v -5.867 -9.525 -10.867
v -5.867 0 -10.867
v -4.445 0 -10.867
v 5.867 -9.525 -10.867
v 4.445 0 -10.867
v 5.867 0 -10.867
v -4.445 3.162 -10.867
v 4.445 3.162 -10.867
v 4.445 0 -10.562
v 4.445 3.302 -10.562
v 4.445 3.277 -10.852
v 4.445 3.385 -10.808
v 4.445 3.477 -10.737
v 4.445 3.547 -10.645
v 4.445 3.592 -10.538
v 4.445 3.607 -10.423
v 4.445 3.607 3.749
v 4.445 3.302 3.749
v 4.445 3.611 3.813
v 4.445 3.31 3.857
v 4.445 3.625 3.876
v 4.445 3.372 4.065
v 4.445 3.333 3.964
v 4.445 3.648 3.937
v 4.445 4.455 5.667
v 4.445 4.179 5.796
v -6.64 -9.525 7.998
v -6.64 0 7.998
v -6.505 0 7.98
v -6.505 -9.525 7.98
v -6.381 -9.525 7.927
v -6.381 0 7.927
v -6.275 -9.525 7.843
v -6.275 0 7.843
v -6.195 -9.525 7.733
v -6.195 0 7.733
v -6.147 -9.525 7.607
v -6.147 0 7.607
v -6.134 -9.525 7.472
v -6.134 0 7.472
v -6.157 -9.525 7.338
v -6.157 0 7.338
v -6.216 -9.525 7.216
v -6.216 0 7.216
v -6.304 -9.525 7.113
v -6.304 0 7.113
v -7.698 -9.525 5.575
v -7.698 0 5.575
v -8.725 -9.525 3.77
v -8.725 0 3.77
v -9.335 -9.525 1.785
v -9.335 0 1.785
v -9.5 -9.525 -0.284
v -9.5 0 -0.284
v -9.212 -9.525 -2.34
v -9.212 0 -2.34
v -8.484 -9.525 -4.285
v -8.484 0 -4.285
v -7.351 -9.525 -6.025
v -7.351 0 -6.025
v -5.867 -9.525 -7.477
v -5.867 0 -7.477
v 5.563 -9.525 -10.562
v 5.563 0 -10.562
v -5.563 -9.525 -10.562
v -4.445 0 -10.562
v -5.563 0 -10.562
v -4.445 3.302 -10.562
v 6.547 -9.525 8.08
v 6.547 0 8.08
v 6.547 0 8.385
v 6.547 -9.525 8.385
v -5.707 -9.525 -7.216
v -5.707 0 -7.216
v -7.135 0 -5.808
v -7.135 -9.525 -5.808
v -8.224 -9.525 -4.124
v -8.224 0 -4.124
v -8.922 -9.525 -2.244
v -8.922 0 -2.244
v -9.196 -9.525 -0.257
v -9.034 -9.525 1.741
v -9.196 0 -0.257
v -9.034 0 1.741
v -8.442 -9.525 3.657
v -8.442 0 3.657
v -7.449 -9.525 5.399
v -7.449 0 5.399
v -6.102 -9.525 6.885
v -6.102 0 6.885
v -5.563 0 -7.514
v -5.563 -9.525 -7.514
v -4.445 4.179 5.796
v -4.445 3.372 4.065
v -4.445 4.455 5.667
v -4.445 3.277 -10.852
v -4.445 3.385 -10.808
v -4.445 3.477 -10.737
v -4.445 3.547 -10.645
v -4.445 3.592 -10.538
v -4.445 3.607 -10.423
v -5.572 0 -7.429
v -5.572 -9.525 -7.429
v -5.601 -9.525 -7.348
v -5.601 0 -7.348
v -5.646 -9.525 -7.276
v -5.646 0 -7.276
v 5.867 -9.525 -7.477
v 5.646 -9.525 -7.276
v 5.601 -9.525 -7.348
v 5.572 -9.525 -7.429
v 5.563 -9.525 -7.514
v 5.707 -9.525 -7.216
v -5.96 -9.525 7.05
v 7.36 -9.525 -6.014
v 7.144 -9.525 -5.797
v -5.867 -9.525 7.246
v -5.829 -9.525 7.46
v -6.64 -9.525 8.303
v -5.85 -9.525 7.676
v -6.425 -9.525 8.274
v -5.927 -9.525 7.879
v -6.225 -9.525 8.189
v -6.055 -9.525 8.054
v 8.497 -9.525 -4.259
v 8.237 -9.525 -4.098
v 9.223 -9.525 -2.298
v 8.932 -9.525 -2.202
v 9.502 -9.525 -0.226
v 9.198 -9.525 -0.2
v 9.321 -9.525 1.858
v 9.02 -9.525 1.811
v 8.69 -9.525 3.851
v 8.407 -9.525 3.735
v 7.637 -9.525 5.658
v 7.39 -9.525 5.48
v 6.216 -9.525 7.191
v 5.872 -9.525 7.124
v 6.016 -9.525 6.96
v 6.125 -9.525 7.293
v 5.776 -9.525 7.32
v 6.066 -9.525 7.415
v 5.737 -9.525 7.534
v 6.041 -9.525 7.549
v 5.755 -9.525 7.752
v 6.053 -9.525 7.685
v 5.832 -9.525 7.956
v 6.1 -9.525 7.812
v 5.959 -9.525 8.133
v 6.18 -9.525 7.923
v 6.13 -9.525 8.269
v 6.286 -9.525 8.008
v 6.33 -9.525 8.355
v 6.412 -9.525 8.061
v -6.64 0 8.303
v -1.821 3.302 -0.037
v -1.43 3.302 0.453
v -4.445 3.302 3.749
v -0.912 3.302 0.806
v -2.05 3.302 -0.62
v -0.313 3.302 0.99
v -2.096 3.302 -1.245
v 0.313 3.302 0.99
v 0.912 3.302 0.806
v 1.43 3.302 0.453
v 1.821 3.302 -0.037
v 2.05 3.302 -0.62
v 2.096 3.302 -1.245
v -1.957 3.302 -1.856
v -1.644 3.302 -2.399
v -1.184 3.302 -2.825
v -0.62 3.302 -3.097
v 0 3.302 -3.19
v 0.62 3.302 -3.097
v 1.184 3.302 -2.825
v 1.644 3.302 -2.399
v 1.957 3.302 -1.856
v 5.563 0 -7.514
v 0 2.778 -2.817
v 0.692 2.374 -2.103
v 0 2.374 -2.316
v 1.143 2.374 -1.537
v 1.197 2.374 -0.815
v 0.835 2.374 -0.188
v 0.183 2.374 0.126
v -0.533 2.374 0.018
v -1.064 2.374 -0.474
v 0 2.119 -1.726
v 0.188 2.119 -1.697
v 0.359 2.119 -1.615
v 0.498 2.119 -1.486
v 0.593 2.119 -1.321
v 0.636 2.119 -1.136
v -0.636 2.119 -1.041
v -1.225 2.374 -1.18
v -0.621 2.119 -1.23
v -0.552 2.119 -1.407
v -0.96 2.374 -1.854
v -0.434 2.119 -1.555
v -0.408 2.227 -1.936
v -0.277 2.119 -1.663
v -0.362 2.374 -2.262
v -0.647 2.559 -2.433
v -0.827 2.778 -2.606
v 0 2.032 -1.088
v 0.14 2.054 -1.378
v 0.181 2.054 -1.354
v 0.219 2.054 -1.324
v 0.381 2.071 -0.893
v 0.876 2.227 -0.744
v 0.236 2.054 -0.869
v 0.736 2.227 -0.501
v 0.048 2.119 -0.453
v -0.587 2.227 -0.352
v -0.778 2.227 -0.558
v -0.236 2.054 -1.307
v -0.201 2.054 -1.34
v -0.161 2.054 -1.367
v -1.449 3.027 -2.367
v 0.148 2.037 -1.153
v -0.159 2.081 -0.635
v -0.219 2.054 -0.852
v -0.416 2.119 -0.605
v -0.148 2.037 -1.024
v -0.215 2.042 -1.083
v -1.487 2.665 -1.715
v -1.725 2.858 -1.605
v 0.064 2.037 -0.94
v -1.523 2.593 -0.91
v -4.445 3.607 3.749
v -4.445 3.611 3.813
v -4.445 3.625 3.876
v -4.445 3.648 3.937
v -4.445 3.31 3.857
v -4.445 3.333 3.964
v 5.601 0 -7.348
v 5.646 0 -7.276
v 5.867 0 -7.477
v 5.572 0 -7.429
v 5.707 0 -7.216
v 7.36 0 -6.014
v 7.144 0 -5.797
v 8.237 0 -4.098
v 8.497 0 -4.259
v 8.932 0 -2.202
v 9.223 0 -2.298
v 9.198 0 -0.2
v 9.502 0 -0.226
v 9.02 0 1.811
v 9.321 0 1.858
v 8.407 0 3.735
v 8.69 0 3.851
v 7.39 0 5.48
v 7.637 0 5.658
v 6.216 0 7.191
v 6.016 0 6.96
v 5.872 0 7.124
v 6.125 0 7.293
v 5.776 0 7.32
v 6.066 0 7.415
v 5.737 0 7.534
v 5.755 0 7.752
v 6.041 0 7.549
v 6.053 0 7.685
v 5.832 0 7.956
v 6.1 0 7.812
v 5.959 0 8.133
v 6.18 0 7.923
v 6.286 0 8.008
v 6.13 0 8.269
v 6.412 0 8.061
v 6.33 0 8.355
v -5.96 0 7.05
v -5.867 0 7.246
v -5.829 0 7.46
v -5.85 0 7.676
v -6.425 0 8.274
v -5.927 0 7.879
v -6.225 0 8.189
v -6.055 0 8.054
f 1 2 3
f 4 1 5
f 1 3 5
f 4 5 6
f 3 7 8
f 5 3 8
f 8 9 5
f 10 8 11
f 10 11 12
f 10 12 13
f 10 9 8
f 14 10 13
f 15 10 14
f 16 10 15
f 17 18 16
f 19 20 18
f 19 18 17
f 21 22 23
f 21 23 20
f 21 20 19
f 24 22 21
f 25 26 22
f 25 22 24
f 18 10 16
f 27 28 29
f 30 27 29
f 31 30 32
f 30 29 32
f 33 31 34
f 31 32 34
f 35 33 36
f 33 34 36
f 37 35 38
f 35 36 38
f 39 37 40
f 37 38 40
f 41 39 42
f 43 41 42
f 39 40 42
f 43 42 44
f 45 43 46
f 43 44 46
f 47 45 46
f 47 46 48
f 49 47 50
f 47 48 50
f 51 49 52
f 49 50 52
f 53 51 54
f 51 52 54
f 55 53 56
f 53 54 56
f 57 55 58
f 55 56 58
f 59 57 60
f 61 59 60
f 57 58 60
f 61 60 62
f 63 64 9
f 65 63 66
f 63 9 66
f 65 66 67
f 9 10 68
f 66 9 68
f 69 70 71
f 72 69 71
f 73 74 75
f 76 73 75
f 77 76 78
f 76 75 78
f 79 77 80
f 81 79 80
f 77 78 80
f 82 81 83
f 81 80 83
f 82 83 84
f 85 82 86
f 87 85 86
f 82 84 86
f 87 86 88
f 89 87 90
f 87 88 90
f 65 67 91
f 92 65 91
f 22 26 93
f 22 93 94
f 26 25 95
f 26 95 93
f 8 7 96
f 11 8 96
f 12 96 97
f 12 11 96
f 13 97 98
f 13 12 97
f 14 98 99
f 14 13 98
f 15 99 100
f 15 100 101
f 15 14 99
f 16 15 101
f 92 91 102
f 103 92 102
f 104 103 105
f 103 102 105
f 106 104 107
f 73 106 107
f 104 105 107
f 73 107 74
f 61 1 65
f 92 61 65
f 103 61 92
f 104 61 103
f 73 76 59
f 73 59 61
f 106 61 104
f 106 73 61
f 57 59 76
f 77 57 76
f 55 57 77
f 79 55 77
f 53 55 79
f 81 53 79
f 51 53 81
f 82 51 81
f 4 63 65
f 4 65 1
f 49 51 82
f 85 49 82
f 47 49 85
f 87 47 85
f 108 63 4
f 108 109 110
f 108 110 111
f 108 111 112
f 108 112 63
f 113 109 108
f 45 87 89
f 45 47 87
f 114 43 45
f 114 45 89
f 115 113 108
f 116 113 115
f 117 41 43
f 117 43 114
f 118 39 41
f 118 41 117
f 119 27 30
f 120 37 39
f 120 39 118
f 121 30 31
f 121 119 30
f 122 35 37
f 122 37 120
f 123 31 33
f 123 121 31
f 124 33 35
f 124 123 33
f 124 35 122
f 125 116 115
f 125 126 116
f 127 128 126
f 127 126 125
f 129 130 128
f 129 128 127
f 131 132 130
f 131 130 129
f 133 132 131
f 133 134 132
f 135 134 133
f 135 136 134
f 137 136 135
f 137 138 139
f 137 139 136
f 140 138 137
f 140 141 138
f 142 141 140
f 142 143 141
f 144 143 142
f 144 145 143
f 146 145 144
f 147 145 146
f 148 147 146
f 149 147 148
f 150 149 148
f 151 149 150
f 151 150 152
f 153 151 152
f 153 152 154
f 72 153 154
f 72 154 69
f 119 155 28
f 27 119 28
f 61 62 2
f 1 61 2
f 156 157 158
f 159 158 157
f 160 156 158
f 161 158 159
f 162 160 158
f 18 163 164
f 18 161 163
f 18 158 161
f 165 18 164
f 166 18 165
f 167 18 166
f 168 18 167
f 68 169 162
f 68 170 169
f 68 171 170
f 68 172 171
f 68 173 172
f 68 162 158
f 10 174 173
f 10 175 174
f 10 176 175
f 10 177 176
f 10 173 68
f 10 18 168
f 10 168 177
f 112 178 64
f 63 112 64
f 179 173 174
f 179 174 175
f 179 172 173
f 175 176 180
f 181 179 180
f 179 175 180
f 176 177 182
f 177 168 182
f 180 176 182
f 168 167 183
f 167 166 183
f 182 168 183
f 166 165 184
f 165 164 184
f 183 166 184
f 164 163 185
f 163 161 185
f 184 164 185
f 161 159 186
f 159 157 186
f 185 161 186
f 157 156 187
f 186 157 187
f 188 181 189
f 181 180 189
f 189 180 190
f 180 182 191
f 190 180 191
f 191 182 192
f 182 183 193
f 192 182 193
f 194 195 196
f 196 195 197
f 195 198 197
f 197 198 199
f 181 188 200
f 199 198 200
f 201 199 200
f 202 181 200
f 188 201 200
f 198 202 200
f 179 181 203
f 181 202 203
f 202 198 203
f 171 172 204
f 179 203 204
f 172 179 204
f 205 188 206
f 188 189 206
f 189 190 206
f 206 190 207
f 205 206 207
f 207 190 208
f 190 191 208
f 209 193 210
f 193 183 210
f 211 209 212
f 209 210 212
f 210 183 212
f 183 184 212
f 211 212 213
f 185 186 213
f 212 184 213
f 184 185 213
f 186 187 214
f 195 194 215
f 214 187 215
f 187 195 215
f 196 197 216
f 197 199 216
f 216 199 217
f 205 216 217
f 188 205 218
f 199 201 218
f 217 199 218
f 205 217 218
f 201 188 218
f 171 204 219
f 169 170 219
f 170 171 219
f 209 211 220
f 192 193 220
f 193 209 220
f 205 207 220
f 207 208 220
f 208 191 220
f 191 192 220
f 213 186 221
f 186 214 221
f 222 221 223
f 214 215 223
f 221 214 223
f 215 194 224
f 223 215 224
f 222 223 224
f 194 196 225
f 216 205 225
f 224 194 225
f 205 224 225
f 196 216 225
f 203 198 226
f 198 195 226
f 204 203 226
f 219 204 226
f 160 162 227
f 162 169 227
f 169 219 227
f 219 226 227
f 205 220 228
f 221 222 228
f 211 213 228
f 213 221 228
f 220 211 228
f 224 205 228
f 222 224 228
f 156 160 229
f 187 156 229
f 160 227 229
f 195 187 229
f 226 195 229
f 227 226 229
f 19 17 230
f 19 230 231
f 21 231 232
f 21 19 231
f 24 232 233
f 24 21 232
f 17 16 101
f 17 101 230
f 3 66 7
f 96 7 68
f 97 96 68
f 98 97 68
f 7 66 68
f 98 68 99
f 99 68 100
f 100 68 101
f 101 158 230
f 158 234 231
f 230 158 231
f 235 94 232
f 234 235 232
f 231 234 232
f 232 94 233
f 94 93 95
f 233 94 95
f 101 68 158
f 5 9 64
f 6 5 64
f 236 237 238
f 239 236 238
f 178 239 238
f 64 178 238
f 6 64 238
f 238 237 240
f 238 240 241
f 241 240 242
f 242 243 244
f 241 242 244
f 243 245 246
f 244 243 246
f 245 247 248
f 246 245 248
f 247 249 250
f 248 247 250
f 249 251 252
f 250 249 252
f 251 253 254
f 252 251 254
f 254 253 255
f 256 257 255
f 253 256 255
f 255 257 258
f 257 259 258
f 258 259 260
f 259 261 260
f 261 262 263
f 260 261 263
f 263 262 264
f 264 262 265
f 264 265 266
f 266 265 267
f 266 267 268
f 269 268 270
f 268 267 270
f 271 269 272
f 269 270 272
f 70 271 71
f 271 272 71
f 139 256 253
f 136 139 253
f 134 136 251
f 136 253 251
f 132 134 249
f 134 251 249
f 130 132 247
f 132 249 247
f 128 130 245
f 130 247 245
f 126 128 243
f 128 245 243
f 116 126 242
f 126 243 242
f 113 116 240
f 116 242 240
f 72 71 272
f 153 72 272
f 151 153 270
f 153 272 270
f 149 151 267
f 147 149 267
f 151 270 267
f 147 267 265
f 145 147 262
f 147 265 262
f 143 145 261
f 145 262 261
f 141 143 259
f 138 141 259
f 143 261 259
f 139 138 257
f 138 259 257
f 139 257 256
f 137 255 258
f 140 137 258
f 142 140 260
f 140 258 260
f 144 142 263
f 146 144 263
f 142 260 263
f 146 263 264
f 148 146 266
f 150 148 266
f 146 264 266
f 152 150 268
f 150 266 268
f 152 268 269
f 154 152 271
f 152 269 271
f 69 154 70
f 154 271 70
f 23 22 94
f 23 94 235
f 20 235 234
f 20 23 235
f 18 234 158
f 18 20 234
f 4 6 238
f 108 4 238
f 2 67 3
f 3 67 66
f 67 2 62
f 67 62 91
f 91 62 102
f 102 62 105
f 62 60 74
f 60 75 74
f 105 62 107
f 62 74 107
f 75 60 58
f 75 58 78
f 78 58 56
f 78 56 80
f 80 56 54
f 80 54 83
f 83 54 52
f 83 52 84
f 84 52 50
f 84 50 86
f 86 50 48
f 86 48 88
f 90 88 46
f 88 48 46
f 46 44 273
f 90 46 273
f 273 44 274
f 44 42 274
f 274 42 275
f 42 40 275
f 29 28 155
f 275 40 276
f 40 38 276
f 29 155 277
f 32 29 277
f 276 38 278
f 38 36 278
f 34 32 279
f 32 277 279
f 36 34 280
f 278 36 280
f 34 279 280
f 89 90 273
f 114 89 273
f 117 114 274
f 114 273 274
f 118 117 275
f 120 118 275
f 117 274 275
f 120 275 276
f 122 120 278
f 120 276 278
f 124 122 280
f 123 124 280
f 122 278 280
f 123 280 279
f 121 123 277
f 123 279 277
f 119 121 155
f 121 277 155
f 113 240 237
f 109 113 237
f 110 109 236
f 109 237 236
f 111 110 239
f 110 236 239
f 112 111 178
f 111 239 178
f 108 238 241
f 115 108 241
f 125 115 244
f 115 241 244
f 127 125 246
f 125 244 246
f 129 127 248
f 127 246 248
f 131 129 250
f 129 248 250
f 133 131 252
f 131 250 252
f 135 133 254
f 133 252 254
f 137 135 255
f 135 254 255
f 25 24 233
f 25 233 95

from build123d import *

# Parameters (mm, degrees)
F1_DEPTH = 9.525
F3_DEPTH = 4.445


with BuildPart() as f1:
    # F0 (on Front) → F1 (new body)
    with BuildSketch(Plane.XZ):
        with BuildLine():
            ThreePointArc((-5.707243, -7.21562), (-9.19628, -0.257349), (-6.101839, 6.885154))
            ThreePointArc((-6.101839, 6.885154), (-5.88147, 7.779725), (-6.639719, 8.303058))
            Line((-6.639719, 8.303058), (-6.639719, 7.998258))
            ThreePointArc((-6.639719, 7.998258), (-6.166454, 7.671617), (-6.303998, 7.113266))
            ThreePointArc((-6.303998, 7.113266), (-9.500428, -0.284281), (-5.8674, -7.47747))
            Line((-5.8674, -7.47747), (-5.8674, -9.920767))
            Line((-5.8674, -9.920767), (-5.8674, -10.867245))
            Line((-5.8674, -10.867245), (5.8674, -10.867245))
            Line((5.8674, -10.867245), (5.8674, -7.47747))
            ThreePointArc((5.8674, -7.47747), (9.502004, -0.225537), (6.215559, 7.190673))
            ThreePointArc((6.215559, 7.190673), (6.072203, 7.750216), (6.54657, 8.079787))
            Line((6.54657, 8.079787), (6.54657, 8.384587))
            ThreePointArc((6.54657, 8.384587), (5.786557, 7.856561), (6.016236, 6.960079))
            ThreePointArc((6.016236, 6.960079), (9.197695, -0.200486), (5.707243, -7.21562))
            ThreePointArc((5.707243, -7.21562), (5.600662, -7.34845), (5.5626, -7.514445))
            Line((5.5626, -7.514445), (5.5626, -10.562445))
            Line((5.5626, -10.562445), (-5.5626, -10.562445))
            Line((-5.5626, -10.562445), (-5.5626, -9.920767))
            Line((-5.5626, -9.920767), (-5.5626, -7.514445))
            ThreePointArc((-5.5626, -7.514445), (-5.600662, -7.34845), (-5.707243, -7.21562))
        make_face()
    extrude(amount=F1_DEPTH)

    # F2 (on Right) → F3 (join, symmetric)
    with BuildSketch(Plane.YZ):
        with BuildLine():
            Line((0, -10.562445), (0, -10.867245))
            Line((0, -10.867245), (3.1623, -10.867245))
            ThreePointArc((3.1623, -10.867245), (3.476609, -10.737054), (3.6068, -10.422745))
            Line((3.6068, -10.422745), (3.6068, 3.748756))
            ThreePointArc((3.6068, 3.748756), (3.617336, 3.844964), (3.648446, 3.93661))
            Line((3.648446, 3.93661), (4.455377, 5.667079))
            Line((4.455377, 5.667079), (4.179134, 5.795893))
            Line((4.179134, 5.795893), (3.372204, 4.065424))
            ThreePointArc((3.372204, 4.065424), (3.319761, 3.910935), (3.302, 3.748756))
            Line((3.302, 3.748756), (3.302, -10.562445))
            Line((3.302, -10.562445), (0, -10.562445))
        make_face()
    extrude(amount=F3_DEPTH, both=True)

    # F4 (on Right) → F5 (revolve)
    with BuildSketch(Plane.YZ):
        with BuildLine():
            Line((3.302, -1.088245), (2.032, -1.088245))
            ThreePointArc((2.032, -1.088245), (2.374146, -2.316276), (3.302, -3.190469))
            Line((3.302, -3.190469), (3.302, -1.088245))
        make_face()
    revolve(axis=Axis((0, 2.667, -1.088245), (0, -1, 0)))


solid = f1.part
